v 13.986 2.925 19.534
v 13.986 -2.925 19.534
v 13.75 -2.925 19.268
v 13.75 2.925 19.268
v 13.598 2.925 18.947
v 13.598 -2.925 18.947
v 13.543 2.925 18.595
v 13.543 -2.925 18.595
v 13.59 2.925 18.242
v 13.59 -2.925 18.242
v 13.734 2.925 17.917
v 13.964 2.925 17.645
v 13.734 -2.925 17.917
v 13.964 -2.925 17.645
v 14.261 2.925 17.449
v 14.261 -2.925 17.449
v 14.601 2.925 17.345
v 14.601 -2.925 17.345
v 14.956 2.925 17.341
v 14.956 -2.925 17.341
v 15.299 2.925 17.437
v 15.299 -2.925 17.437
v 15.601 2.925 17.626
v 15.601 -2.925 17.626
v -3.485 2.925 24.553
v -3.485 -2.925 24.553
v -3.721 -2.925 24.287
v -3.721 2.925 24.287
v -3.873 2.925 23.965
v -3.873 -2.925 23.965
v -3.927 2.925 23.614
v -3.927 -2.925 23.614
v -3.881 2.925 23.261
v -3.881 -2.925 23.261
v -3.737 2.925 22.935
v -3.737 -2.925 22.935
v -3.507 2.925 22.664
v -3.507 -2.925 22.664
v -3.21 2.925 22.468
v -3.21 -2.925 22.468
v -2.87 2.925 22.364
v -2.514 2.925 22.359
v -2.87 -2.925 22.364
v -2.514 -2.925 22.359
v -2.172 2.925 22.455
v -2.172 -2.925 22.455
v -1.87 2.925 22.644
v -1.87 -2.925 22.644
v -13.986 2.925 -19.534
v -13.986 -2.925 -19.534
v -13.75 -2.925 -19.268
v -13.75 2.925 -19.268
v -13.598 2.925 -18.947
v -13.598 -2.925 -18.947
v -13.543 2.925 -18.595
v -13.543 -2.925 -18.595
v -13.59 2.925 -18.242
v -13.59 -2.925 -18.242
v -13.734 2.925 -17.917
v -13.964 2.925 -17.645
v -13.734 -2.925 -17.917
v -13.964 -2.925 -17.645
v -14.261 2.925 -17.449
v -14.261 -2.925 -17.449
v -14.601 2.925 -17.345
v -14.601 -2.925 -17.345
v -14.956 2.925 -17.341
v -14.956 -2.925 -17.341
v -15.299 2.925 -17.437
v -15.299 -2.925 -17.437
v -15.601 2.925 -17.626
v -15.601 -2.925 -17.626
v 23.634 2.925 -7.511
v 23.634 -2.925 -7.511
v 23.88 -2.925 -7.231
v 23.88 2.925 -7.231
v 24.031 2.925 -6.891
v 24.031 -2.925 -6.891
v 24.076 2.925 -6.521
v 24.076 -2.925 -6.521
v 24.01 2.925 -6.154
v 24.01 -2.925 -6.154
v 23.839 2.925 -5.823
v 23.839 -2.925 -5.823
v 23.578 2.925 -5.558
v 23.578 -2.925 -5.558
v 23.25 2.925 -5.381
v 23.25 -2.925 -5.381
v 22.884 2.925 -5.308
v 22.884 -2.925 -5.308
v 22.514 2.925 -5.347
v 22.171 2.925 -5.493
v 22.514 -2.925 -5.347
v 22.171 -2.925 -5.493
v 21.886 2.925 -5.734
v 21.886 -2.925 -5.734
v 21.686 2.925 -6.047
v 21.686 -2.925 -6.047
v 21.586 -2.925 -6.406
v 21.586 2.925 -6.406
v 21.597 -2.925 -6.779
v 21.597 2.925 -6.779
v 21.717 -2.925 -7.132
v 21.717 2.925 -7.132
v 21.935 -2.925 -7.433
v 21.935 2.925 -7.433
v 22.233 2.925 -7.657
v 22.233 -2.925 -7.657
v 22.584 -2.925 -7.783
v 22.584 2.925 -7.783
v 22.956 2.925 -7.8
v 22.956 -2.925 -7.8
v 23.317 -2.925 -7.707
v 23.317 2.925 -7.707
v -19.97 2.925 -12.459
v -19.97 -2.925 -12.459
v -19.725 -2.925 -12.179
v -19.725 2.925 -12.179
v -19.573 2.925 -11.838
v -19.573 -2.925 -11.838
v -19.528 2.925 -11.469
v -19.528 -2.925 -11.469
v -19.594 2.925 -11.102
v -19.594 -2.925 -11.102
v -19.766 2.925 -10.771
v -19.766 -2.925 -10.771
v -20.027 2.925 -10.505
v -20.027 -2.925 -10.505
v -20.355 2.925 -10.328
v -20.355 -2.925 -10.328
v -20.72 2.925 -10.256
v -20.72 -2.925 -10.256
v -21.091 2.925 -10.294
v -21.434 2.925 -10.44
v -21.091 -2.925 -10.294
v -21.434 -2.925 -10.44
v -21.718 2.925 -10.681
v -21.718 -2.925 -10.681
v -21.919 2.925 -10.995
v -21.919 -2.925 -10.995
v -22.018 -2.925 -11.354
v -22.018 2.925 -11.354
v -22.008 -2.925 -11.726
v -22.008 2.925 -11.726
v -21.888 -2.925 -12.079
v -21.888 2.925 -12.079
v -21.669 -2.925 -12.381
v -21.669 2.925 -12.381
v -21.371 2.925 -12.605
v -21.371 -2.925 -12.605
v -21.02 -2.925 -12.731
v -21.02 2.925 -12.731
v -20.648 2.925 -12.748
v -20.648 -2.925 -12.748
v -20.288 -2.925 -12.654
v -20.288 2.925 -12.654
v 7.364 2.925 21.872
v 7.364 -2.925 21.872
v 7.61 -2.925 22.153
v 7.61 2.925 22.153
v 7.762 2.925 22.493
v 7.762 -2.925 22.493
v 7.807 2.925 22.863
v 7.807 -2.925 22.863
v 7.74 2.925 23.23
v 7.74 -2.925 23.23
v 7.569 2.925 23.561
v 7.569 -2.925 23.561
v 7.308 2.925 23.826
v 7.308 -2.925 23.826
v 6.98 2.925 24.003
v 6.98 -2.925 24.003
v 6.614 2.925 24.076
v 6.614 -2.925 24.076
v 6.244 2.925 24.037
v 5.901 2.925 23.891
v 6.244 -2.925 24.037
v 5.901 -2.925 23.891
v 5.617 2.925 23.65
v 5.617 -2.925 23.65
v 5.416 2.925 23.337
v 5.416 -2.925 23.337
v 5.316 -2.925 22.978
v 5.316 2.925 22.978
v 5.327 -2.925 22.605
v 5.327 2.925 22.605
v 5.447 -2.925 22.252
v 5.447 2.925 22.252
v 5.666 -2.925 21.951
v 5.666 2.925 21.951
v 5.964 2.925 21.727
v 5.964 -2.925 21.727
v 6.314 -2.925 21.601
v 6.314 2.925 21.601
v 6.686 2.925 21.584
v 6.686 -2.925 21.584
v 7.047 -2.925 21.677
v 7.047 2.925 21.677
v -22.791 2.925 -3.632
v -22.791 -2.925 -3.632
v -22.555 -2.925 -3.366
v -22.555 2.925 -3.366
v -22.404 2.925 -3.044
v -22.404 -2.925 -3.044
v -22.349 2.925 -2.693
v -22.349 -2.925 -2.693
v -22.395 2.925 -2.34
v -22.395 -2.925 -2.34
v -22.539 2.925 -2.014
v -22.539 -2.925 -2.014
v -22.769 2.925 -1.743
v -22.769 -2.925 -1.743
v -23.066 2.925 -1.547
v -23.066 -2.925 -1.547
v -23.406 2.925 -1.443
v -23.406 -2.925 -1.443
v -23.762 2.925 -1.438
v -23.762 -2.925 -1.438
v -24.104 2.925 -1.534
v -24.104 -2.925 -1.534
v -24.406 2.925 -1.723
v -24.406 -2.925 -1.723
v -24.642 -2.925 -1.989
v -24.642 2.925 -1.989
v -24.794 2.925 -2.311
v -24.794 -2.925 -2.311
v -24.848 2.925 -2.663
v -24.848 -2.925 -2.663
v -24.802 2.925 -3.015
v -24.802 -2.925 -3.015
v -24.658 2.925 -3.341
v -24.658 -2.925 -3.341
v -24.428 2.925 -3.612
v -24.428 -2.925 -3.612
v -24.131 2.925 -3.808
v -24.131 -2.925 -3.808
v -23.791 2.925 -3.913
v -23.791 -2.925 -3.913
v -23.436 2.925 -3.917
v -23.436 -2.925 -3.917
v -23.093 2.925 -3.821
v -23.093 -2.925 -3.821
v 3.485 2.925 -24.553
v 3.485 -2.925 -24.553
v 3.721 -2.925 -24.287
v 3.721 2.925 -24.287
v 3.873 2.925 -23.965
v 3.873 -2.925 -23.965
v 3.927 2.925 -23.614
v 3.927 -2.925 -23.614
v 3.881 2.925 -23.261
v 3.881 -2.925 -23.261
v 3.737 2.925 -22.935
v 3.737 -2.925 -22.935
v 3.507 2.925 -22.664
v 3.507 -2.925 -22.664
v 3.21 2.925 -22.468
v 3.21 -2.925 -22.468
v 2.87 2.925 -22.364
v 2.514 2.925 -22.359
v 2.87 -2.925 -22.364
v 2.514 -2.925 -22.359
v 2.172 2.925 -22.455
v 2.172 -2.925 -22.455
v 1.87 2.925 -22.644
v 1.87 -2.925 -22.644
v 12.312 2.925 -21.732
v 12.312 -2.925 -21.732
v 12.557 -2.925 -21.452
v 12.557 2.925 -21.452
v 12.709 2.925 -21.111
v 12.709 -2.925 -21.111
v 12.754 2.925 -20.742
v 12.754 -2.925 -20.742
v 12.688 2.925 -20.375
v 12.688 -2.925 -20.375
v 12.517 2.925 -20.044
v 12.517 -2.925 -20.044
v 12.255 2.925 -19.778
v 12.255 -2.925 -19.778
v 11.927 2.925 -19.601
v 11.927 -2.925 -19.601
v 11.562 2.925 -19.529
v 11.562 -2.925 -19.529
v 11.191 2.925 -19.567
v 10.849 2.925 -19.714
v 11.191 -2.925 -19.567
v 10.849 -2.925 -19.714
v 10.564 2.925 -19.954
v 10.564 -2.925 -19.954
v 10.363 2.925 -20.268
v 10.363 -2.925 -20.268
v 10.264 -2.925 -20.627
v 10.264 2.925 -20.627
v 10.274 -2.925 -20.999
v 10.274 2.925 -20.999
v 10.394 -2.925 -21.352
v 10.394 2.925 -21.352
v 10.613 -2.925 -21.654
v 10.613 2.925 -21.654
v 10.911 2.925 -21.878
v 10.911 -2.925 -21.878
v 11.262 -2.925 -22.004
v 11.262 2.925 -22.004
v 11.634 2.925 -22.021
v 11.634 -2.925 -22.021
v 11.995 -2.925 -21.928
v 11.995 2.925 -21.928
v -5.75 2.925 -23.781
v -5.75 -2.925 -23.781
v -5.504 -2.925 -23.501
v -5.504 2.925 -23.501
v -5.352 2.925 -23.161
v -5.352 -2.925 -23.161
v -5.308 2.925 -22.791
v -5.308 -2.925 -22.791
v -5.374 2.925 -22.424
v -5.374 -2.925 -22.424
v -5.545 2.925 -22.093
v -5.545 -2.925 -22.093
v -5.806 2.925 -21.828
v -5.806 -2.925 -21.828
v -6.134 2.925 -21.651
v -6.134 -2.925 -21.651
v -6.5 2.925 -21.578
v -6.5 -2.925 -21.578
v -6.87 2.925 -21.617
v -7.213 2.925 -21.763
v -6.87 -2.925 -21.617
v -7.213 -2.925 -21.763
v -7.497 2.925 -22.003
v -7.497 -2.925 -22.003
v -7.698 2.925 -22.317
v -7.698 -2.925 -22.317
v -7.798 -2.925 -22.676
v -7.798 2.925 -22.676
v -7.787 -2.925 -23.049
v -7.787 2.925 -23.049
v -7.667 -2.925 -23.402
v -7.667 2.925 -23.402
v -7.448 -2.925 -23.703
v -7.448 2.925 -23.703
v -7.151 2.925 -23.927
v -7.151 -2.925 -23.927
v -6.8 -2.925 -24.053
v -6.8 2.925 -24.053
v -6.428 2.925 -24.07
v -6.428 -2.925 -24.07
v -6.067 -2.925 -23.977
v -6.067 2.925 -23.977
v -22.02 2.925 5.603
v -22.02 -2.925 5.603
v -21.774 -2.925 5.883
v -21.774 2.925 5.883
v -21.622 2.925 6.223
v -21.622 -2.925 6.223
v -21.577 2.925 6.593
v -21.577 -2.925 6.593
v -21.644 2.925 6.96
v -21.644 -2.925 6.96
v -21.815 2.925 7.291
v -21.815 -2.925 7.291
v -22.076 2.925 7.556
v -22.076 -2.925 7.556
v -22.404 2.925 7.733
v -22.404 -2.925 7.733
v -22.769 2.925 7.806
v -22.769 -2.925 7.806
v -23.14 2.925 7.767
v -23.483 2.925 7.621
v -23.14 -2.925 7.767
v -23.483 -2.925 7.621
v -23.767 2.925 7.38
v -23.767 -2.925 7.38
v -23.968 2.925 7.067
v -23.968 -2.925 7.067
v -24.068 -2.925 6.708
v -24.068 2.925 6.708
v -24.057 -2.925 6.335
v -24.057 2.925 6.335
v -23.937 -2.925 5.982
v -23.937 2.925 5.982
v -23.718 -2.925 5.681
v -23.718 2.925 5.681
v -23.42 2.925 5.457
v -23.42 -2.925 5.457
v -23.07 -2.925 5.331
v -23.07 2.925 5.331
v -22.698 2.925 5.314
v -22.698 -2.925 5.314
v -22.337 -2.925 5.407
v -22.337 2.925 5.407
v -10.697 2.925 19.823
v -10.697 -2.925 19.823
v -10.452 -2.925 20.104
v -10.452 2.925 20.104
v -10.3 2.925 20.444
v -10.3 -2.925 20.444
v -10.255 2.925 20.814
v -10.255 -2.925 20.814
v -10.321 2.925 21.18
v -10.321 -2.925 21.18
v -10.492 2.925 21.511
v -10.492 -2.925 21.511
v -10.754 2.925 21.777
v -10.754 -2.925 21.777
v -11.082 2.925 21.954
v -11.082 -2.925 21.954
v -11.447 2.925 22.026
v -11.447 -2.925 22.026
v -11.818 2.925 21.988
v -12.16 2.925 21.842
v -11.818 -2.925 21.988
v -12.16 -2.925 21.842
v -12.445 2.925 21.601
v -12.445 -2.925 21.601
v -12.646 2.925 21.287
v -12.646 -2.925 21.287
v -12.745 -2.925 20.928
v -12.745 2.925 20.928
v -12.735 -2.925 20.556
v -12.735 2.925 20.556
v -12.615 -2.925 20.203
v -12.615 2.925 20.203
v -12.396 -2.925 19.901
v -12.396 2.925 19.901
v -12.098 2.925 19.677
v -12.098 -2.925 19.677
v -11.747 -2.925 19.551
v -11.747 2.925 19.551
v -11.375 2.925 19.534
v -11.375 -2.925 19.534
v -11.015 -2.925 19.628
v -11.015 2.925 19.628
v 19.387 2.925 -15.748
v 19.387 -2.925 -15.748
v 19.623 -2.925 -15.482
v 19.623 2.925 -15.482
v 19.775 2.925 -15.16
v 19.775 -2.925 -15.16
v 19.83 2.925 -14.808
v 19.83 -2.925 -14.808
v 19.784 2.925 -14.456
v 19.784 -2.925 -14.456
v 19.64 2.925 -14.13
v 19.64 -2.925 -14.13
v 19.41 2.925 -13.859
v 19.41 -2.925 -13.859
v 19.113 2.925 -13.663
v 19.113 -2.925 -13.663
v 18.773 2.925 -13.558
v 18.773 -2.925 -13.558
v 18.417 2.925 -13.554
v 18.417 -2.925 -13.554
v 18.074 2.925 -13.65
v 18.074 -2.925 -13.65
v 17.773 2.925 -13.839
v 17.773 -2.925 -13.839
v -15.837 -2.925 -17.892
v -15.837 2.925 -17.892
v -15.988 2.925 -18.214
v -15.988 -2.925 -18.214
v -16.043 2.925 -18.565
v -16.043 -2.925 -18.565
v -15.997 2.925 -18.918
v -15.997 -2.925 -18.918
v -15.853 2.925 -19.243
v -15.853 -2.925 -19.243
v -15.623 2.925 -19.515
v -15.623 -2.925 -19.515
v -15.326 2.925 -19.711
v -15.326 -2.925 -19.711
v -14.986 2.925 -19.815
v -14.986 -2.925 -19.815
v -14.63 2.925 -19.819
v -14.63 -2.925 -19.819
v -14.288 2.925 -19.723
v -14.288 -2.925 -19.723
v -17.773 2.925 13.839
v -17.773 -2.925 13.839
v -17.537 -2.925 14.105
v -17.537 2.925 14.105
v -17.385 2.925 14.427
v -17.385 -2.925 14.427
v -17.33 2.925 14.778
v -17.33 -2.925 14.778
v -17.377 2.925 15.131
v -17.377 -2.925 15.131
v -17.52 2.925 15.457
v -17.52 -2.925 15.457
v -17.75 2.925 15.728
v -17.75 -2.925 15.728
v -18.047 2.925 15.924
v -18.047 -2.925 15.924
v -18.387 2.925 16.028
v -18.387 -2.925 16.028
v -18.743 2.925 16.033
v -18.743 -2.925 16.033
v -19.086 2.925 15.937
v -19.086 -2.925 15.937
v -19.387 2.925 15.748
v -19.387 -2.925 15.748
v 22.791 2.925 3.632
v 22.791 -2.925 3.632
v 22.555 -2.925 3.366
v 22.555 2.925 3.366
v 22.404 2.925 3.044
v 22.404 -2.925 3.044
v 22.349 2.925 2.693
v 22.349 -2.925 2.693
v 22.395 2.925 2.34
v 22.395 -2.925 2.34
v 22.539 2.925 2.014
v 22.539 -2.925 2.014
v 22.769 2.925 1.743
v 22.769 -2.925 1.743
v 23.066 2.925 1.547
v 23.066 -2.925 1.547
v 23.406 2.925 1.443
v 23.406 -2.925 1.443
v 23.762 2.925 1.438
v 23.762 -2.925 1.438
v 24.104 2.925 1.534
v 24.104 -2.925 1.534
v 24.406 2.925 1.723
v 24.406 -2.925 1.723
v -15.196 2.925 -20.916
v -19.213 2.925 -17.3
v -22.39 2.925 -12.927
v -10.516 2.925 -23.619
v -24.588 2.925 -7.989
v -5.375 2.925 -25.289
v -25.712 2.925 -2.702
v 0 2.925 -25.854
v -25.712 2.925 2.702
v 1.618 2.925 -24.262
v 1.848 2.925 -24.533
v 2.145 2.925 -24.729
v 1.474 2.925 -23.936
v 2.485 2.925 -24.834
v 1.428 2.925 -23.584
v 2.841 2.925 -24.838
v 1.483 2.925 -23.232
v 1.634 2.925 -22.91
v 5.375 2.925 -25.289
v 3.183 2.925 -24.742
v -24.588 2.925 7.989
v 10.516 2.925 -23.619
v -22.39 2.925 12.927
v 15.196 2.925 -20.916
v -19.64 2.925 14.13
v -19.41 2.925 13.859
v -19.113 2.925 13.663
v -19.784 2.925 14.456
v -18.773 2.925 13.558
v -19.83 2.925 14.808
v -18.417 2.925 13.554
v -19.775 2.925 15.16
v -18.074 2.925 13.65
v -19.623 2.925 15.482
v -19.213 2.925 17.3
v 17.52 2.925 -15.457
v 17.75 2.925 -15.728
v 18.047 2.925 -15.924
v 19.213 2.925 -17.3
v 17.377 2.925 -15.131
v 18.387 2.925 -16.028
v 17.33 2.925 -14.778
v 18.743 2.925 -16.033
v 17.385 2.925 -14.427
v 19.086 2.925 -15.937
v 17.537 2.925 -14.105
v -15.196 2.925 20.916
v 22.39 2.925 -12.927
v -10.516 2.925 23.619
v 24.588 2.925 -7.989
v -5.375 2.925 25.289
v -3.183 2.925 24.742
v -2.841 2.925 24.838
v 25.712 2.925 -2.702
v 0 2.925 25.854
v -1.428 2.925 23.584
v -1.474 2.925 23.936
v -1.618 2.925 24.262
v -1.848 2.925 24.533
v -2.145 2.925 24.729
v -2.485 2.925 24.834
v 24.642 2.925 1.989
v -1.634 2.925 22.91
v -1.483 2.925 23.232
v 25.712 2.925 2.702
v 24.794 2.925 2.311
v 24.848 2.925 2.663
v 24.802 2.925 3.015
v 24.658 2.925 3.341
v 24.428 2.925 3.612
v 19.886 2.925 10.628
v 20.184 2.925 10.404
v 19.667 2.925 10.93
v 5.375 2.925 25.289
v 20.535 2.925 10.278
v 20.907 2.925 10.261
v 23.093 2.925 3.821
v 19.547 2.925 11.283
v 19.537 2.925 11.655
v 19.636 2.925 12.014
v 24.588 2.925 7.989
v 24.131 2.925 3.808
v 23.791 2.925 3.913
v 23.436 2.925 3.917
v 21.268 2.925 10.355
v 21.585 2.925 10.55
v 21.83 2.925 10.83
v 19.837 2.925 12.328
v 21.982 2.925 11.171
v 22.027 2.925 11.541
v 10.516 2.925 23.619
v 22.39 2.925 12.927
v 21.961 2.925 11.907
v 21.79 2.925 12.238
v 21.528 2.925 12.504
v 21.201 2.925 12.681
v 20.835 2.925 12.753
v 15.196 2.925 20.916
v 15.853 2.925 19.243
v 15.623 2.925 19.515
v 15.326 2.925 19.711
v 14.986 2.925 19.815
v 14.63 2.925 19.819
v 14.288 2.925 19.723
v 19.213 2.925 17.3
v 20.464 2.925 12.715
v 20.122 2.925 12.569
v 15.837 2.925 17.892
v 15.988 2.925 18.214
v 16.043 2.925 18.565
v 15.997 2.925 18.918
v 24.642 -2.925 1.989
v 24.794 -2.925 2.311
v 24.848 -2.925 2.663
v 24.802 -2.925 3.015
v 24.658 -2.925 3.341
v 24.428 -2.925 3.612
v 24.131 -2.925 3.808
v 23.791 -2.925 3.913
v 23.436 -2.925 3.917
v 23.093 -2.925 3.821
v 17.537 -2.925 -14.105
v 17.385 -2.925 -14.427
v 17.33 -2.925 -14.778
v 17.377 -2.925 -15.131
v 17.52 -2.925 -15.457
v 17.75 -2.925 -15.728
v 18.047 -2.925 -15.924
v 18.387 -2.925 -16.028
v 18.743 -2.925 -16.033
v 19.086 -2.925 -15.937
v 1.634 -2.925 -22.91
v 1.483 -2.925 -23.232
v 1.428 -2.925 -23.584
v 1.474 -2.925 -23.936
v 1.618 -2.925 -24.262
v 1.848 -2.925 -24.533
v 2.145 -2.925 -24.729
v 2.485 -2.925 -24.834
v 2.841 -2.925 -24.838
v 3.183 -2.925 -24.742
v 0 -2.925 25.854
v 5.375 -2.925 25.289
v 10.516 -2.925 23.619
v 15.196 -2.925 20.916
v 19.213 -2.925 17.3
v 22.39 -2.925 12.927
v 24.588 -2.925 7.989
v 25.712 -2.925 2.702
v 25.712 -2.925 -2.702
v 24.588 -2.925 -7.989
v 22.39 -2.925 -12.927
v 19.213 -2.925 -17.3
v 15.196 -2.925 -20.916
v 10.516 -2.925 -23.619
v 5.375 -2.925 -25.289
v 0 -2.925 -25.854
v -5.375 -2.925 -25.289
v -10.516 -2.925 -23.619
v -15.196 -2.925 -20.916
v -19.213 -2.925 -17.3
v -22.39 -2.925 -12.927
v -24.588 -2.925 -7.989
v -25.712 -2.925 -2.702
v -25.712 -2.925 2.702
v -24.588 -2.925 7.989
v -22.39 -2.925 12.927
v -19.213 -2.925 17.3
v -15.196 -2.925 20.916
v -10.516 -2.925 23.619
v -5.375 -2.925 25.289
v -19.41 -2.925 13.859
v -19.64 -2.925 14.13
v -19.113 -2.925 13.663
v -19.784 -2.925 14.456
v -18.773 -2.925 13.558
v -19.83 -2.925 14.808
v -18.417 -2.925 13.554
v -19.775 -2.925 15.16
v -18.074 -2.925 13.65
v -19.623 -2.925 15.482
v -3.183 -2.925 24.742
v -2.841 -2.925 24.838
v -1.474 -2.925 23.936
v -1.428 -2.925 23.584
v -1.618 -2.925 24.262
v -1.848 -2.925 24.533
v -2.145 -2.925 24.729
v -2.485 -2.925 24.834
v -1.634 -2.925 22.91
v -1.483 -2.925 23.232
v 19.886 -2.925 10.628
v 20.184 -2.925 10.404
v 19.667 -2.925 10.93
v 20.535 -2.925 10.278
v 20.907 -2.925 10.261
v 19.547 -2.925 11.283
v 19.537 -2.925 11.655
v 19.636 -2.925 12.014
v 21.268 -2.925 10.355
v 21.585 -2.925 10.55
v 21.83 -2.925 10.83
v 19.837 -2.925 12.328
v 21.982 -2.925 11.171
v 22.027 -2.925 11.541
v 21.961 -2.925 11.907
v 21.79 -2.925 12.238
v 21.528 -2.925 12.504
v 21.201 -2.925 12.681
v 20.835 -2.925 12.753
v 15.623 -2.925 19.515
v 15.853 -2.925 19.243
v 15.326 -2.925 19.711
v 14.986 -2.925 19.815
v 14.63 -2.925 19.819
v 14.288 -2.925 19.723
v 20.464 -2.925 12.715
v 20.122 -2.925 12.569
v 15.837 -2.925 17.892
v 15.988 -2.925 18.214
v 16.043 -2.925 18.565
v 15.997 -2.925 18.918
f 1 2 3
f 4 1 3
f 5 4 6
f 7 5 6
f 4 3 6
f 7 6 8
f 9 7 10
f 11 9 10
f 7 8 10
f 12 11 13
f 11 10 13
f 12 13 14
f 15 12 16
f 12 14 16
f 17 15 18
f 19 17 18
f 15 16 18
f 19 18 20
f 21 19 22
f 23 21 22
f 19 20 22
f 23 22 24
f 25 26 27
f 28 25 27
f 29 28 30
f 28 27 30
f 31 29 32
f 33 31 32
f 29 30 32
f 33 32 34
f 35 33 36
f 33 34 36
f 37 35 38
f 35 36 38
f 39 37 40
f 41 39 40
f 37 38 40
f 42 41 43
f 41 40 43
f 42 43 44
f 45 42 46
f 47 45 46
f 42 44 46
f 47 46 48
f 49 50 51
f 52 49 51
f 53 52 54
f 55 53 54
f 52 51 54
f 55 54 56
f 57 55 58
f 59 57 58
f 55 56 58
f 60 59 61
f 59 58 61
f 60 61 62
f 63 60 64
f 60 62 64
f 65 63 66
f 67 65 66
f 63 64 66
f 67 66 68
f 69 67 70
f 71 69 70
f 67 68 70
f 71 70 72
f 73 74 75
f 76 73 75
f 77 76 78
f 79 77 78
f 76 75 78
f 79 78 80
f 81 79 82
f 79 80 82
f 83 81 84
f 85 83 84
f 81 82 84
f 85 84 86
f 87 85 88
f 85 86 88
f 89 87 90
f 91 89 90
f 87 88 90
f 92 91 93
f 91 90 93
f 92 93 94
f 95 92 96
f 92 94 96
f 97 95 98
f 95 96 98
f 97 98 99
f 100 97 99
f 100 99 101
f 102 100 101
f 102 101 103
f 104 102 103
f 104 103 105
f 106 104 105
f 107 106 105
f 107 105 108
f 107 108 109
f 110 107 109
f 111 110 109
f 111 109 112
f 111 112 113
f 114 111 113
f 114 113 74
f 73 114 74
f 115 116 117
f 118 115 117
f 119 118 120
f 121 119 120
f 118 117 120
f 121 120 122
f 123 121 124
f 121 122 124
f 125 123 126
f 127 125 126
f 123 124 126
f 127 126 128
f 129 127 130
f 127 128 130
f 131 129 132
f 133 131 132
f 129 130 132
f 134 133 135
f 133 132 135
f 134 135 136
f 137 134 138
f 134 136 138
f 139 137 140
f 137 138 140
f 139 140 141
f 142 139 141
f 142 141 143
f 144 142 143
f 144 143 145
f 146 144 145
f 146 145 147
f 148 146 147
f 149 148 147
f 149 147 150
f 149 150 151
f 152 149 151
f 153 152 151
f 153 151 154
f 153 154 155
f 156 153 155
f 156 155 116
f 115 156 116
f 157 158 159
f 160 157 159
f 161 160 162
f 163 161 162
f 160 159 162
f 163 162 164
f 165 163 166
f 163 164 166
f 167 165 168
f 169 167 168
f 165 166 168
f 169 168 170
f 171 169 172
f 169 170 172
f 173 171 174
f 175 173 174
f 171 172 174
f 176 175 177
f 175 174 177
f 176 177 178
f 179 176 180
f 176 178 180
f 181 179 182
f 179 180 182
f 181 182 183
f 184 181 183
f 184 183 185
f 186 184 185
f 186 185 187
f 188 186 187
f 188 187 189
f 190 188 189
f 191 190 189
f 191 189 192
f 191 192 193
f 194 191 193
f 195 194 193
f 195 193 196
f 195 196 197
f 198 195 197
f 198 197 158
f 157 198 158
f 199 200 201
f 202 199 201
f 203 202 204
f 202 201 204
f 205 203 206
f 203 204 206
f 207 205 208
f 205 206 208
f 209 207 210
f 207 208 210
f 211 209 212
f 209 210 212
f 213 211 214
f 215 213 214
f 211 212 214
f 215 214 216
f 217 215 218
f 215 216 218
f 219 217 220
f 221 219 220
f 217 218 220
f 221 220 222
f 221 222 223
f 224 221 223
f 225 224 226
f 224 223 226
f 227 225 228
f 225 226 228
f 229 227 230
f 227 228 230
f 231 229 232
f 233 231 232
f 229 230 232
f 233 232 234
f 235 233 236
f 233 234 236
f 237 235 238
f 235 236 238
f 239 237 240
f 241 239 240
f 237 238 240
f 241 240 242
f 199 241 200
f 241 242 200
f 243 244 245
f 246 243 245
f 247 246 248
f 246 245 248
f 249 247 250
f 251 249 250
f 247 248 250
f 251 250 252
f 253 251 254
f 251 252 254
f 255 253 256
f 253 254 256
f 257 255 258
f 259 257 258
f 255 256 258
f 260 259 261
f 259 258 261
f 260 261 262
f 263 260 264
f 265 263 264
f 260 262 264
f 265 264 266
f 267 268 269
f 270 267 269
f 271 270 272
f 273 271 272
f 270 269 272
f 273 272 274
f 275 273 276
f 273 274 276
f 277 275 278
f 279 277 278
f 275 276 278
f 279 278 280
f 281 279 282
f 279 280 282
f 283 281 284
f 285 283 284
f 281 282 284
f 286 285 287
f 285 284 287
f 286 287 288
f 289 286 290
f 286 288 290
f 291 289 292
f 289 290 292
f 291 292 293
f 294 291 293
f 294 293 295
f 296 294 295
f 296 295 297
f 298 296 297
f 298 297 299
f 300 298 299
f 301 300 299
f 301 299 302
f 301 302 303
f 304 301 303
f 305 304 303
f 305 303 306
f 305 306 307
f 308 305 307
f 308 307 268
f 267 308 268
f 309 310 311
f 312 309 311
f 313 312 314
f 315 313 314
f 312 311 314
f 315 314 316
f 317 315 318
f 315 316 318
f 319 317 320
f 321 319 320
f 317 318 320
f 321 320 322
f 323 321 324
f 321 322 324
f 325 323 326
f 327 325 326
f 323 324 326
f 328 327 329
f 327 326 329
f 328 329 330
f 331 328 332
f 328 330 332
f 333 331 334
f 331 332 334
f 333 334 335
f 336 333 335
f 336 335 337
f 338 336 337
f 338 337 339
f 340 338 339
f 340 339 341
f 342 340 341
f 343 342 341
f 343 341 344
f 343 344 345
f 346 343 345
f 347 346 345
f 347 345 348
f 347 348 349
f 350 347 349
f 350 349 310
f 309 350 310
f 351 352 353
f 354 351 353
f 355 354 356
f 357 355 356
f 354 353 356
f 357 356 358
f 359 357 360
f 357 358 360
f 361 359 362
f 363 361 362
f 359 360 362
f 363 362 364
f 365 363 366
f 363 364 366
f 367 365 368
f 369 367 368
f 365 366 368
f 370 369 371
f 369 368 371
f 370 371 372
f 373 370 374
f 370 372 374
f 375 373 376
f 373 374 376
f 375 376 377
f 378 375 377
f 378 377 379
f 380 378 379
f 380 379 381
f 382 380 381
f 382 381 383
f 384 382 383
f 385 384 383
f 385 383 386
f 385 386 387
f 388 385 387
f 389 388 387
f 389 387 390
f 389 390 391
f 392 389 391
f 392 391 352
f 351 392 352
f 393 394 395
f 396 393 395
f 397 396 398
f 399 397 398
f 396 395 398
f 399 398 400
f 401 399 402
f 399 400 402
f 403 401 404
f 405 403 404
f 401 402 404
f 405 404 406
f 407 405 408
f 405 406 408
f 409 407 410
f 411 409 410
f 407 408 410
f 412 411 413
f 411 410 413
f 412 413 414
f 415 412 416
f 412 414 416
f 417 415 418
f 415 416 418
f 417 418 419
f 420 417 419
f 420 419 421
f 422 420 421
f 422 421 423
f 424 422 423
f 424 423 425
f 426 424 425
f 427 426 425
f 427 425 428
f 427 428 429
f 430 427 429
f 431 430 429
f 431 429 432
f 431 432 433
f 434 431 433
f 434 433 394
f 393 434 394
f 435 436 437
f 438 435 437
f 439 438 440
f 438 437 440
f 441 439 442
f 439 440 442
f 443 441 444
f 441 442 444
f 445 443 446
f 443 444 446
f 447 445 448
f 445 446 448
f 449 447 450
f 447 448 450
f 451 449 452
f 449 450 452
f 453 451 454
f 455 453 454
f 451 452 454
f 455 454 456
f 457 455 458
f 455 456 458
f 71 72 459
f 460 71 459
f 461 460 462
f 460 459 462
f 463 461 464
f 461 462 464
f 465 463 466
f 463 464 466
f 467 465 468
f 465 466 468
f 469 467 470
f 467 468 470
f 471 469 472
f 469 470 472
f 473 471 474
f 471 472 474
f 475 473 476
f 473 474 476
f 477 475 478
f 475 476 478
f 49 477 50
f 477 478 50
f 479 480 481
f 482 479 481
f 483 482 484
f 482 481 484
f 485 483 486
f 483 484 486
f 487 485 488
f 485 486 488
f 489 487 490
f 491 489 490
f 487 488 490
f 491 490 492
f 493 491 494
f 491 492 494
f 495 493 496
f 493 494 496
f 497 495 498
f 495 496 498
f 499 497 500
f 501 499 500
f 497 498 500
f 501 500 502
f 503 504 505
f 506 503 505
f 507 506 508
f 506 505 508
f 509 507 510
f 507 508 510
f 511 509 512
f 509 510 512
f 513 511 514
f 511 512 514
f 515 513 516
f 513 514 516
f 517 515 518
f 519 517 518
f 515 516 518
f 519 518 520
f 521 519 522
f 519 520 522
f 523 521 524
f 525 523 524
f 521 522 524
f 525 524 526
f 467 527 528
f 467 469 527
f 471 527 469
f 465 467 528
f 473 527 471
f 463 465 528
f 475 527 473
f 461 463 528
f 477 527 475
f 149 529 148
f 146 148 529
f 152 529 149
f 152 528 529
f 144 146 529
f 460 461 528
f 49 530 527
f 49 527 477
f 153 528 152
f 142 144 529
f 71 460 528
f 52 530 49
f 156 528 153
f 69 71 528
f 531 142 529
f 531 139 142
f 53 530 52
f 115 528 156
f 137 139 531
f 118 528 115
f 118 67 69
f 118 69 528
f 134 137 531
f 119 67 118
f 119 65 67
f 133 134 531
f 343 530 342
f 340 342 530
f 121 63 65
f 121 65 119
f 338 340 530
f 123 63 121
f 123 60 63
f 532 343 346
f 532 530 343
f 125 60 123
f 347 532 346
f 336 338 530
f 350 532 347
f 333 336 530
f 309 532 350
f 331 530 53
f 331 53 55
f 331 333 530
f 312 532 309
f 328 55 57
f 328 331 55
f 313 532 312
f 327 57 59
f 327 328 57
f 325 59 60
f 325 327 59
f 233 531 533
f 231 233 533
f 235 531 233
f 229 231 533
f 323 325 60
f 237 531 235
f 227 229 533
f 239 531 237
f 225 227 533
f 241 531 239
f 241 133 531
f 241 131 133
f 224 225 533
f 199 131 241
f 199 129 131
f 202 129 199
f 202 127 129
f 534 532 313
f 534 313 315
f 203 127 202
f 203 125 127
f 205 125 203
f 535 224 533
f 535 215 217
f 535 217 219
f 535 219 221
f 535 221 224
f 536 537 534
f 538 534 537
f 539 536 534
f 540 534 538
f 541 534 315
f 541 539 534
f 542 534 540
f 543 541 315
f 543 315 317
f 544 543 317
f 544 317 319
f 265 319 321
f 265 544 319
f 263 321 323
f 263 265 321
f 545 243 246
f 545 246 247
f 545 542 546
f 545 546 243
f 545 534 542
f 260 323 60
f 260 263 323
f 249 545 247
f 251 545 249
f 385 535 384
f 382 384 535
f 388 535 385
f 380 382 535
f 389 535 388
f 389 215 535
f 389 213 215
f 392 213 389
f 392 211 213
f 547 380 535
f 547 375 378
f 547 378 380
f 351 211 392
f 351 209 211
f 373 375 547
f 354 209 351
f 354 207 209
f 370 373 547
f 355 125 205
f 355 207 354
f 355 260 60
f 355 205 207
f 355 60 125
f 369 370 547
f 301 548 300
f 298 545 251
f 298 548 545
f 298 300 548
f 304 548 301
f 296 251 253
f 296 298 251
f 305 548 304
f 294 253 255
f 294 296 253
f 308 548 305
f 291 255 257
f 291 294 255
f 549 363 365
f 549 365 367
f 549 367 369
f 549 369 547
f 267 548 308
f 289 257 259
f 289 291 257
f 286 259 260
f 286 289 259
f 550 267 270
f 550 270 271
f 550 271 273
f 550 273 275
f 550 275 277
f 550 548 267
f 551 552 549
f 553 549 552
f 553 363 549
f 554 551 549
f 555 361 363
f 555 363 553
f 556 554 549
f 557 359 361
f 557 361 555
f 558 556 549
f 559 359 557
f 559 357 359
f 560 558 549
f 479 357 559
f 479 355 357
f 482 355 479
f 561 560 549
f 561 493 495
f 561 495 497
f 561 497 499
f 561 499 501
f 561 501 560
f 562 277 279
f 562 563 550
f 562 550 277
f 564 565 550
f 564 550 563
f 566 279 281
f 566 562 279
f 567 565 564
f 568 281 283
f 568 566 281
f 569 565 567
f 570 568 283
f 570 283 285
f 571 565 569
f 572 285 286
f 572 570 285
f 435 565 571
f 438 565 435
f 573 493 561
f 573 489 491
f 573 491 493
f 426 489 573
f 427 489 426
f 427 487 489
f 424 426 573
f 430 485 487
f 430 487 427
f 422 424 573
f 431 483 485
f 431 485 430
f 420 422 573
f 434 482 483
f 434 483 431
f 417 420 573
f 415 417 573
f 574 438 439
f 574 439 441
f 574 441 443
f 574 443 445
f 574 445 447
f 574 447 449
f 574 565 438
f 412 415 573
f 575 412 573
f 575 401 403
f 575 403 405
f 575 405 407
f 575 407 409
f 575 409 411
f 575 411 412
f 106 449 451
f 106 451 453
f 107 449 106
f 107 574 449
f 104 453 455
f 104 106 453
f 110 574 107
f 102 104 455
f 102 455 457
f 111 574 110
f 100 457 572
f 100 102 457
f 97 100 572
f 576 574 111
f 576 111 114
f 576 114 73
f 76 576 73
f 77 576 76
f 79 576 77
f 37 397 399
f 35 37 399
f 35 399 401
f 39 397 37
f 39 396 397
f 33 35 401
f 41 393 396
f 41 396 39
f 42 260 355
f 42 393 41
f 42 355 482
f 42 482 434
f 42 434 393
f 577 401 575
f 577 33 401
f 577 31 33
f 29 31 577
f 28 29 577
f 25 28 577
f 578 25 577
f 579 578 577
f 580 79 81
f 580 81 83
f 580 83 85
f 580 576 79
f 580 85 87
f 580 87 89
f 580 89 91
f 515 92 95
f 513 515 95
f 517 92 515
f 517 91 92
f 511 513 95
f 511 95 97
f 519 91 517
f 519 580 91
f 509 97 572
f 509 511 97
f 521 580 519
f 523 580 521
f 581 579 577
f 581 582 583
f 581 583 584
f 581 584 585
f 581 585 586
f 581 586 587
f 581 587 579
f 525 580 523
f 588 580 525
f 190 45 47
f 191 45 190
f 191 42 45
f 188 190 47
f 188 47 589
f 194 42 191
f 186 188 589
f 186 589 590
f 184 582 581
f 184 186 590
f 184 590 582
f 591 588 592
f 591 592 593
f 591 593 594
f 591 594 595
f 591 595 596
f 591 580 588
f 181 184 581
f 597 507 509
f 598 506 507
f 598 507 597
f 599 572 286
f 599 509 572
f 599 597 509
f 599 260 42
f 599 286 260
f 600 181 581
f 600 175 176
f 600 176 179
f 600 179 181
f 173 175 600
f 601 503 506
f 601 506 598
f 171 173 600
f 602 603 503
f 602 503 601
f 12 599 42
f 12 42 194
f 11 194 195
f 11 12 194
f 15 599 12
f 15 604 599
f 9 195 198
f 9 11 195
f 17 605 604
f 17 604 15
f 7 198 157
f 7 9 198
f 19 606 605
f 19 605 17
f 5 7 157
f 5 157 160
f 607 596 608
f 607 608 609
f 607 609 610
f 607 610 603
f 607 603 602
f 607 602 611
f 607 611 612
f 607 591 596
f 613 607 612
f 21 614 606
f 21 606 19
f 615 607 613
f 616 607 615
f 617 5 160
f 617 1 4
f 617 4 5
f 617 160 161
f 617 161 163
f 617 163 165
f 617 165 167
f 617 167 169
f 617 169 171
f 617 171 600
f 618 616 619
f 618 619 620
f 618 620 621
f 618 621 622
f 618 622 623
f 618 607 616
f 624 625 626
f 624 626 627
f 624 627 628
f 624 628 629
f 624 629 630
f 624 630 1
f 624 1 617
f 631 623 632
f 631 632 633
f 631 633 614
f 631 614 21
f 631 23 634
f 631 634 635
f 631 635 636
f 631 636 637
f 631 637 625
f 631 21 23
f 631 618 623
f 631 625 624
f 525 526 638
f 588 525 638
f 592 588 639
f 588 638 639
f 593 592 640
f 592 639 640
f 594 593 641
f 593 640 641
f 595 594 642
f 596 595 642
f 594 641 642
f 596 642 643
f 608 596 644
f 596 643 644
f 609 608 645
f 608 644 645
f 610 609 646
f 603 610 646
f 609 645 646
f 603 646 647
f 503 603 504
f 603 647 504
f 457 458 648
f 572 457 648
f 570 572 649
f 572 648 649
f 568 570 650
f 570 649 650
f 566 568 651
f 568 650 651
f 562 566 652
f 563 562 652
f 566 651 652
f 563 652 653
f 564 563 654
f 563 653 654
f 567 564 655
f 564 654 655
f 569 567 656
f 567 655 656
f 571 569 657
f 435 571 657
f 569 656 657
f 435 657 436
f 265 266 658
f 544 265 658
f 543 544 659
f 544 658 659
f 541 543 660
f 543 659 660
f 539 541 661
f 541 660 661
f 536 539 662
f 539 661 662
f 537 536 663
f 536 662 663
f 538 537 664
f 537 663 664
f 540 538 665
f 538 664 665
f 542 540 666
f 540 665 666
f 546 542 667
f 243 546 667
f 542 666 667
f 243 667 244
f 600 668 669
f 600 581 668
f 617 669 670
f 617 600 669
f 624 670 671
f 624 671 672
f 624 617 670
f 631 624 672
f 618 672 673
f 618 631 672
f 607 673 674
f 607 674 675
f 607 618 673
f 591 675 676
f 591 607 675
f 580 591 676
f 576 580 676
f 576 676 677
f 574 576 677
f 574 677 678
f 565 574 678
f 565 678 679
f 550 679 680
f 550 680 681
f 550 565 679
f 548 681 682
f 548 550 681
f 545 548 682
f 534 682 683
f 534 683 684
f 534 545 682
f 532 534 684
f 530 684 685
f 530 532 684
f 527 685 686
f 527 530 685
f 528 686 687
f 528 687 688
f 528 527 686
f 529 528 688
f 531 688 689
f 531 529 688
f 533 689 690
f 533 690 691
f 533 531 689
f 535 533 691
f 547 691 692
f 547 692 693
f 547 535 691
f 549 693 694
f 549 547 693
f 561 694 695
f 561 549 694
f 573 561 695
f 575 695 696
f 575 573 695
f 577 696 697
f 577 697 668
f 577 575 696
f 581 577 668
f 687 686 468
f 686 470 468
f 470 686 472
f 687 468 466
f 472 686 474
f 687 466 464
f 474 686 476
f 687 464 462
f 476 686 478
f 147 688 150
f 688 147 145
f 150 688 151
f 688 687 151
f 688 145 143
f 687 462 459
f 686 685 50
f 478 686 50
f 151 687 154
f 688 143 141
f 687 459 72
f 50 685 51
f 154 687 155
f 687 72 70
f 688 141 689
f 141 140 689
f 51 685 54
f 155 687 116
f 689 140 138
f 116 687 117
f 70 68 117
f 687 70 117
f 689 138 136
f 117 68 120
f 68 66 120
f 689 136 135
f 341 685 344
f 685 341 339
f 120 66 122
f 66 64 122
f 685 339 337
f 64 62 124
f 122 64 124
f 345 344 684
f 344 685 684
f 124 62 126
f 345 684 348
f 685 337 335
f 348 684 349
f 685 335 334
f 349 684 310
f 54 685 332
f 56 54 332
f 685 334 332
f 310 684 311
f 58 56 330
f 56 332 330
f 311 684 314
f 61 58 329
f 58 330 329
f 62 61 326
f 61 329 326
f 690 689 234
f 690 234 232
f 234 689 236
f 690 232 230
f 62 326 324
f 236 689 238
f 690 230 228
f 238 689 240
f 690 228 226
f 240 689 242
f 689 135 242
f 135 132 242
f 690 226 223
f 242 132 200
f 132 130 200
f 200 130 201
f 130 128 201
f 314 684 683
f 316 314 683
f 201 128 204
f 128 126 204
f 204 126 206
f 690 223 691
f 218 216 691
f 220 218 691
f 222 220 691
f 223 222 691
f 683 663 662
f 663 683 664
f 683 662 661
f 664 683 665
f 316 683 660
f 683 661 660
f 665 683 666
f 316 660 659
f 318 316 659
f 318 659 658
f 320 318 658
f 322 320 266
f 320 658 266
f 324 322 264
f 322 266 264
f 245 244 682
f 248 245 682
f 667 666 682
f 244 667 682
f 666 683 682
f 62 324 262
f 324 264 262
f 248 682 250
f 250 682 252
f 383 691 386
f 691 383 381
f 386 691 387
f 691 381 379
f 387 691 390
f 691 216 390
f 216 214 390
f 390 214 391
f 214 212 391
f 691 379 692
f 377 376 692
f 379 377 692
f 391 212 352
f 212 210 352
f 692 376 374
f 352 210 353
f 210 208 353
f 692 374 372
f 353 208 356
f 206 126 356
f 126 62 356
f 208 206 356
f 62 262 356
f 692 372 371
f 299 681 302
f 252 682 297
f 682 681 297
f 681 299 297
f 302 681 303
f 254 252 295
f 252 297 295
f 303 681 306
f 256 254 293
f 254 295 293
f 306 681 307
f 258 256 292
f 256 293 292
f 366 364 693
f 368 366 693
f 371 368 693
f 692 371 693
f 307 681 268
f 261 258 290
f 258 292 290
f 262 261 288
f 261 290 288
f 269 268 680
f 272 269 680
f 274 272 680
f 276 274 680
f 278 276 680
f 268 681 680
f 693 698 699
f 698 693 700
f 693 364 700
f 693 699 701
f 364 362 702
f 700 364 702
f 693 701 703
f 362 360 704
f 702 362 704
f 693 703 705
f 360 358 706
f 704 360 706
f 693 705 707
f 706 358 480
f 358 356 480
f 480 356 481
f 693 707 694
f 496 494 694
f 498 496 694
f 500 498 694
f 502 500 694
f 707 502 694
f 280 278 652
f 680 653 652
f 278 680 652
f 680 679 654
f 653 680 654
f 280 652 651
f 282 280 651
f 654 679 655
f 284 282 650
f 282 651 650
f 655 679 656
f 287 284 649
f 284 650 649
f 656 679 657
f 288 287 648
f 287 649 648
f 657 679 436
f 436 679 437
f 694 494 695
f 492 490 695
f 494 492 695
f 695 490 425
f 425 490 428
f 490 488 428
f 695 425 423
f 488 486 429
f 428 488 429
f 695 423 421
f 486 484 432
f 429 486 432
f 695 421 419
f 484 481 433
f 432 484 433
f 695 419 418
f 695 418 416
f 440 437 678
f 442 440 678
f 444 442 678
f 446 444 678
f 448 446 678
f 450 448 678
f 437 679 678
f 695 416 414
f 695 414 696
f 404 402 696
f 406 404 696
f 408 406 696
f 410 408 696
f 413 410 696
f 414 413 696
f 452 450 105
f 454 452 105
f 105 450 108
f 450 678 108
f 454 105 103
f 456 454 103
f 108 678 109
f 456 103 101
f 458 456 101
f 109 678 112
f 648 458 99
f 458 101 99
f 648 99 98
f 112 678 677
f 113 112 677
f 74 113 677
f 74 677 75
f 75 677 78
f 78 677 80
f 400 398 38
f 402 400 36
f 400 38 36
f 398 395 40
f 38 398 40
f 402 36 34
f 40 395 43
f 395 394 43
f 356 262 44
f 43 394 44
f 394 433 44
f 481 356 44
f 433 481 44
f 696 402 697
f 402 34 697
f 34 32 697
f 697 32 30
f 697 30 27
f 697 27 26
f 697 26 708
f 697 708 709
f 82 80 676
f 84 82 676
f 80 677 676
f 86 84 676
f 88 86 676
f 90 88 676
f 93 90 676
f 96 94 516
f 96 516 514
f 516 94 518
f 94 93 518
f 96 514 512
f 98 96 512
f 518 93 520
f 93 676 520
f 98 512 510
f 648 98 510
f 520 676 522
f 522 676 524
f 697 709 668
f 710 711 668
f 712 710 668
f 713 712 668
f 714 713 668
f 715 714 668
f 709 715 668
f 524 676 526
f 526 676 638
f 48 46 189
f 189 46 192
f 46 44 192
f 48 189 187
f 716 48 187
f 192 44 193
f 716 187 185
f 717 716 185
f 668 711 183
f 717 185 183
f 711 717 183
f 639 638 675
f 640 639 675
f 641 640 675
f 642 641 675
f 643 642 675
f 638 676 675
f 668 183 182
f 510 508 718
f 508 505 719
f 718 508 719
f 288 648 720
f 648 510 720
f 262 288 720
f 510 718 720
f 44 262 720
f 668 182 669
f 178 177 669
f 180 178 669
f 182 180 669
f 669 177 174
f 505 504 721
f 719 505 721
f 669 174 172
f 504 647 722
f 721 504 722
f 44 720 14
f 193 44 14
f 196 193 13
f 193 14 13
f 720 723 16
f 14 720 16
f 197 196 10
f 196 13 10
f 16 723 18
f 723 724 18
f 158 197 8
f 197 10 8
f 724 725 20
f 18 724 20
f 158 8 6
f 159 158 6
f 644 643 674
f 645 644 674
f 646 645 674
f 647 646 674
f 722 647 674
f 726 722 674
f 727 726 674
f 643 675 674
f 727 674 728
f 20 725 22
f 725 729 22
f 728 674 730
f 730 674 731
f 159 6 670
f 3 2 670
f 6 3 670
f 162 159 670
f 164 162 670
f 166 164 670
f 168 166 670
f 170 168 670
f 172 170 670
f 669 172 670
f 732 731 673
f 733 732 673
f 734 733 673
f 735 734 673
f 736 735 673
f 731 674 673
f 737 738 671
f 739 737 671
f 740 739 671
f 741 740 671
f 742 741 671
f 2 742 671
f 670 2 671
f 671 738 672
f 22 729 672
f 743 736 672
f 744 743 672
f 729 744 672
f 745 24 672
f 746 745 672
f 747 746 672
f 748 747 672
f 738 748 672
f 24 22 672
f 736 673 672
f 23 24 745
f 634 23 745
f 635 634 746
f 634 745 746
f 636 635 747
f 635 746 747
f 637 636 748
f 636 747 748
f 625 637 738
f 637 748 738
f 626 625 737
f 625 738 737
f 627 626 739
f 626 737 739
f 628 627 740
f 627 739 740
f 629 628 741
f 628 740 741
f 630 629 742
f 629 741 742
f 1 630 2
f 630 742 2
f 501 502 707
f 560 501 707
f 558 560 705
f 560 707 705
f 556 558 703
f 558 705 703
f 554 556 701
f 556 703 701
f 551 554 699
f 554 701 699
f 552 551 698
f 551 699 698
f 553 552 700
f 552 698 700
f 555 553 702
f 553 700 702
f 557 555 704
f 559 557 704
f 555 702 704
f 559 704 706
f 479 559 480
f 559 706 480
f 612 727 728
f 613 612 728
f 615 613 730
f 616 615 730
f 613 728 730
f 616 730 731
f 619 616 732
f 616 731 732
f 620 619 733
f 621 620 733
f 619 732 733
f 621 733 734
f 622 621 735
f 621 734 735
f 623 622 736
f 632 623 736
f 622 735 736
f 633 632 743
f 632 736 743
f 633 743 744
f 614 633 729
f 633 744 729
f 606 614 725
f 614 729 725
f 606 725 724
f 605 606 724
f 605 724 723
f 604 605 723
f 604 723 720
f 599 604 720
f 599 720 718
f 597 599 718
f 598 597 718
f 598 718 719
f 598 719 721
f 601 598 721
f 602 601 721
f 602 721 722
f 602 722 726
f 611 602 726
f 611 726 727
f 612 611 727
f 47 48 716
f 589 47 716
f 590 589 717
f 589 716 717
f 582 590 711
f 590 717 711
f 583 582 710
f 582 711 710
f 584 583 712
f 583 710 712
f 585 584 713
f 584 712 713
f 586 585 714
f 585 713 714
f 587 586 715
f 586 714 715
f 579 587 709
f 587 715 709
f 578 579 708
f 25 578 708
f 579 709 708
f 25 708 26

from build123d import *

# Parameters (mm, degrees)
SKETCH1_R           = 25.85370091
BOSS_EXTRUDE1_DEPTH = 2.925
CUT_EXTRUDE1_DEPTH  = 38.02769506


with BuildPart() as part:
    # Sketch1 → Boss-Extrude1 (new, symmetric)
    with BuildSketch(Plane(origin=(0, 0, 0), x_dir=(1, 0, 0), z_dir=(0, 1, 0))):
        with Locations(Location((0, 0, 0), (0, 0, 270))):
            Circle(SKETCH1_R)
    extrude(amount=BOSS_EXTRUDE1_DEPTH, both=True)

    # Sketch2 → Cut-Extrude1 (cut, through all)
    with BuildSketch(Plane.XZ.offset(2.925)):
        with BuildLine():
            ThreePointArc((22.019698731, -5.602620776), (21.872491194, -7.364247848), (23.634118266, -7.511455385))
            ThreePointArc((23.634118266, -7.511455385), (23.781325803, -5.749828313), (22.019698731, -5.602620776))
        make_face()
        with BuildLine():
            ThreePointArc((22.791373624, 3.631983723), (22.644166087, 1.87035665), (24.405793159, 1.723149114))
            ThreePointArc((24.405793159, 1.723149114), (24.553000696, 3.484776186), (22.791373624, 3.631983723))
        make_face()
        with BuildLine():
            ThreePointArc((17.772833946, -13.838975667), (17.625626409, -15.600602739), (19.387253481, -15.747810276))
            ThreePointArc((19.387253481, -15.747810276), (19.534461018, -13.986183203), (17.772833946, -13.838975667))
        make_face()
        with BuildLine():
            ThreePointArc((10.697325934, -19.82317058), (10.550118397, -21.584797652), (12.311745469, -21.732005189))
            ThreePointArc((12.311745469, -21.732005189), (12.458953006, -19.970378117), (10.697325934, -19.82317058))
        make_face()
        with BuildLine():
            ThreePointArc((1.87035665, -22.644166087), (1.723149114, -24.405793159), (3.484776186, -24.553000696))
            ThreePointArc((3.484776186, -24.553000696), (3.631983723, -22.791373624), (1.87035665, -22.644166087))
        make_face()
        with BuildLine():
            ThreePointArc((-7.364247848, -21.872491194), (-7.511455385, -23.634118266), (-5.749828313, -23.781325803))
            ThreePointArc((-5.749828313, -23.781325803), (-5.602620776, -22.019698731), (-7.364247848, -21.872491194))
        make_face()
        with BuildLine():
            ThreePointArc((-15.600602739, -17.625626409), (-15.747810276, -19.387253481), (-13.986183203, -19.534461018))
            ThreePointArc((-13.986183203, -19.534461018), (-13.838975667, -17.772833946), (-15.600602739, -17.625626409))
        make_face()
        with BuildLine():
            ThreePointArc((-21.584797652, -10.550118397), (-21.732005189, -12.311745469), (-19.970378117, -12.458953006))
            ThreePointArc((-19.970378117, -12.458953006), (-19.82317058, -10.697325934), (-21.584797652, -10.550118397))
        make_face()
        with BuildLine():
            ThreePointArc((-24.405793159, -1.723149114), (-24.553000696, -3.484776186), (-22.791373624, -3.631983723))
            ThreePointArc((-22.791373624, -3.631983723), (-22.644166087, -1.87035665), (-24.405793159, -1.723149114))
        make_face()
        with BuildLine():
            ThreePointArc((-23.634118266, 7.511455385), (-23.781325803, 5.749828313), (-22.019698731, 5.602620776))
            ThreePointArc((-22.019698731, 5.602620776), (-21.872491194, 7.364247848), (-23.634118266, 7.511455385))
        make_face()
        with BuildLine():
            ThreePointArc((-19.387253481, 15.747810276), (-19.534461018, 13.986183203), (-17.772833946, 13.838975667))
            ThreePointArc((-17.772833946, 13.838975667), (-17.625626409, 15.600602739), (-19.387253481, 15.747810276))
        make_face()
        with BuildLine():
            ThreePointArc((-12.311745469, 21.732005189), (-12.458953006, 19.970378117), (-10.697325934, 19.82317058))
            ThreePointArc((-10.697325934, 19.82317058), (-10.550118397, 21.584797652), (-12.311745469, 21.732005189))
        make_face()
        with BuildLine():
            ThreePointArc((-3.484776186, 24.553000696), (-3.631983723, 22.791373624), (-1.87035665, 22.644166087))
            ThreePointArc((-1.87035665, 22.644166087), (-1.723149114, 24.405793159), (-3.484776186, 24.553000696))
        make_face()
        with BuildLine():
            ThreePointArc((5.749828313, 23.781325803), (5.602620776, 22.019698731), (7.364247848, 21.872491194))
            ThreePointArc((7.364247848, 21.872491194), (7.511455385, 23.634118266), (5.749828313, 23.781325803))
        make_face()
        with BuildLine():
            ThreePointArc((19.970378117, 12.458953006), (19.82317058, 10.697325934), (21.584797652, 10.550118397))
            ThreePointArc((21.584797652, 10.550118397), (21.732005189, 12.311745469), (19.970378117, 12.458953006))
        make_face()
        with BuildLine():
            ThreePointArc((13.986183203, 19.534461018), (13.838975667, 17.772833946), (15.600602739, 17.625626409))
            ThreePointArc((15.600602739, 17.625626409), (15.747810276, 19.387253481), (13.986183203, 19.534461018))
        make_face()
    extrude(amount=-CUT_EXTRUDE1_DEPTH, mode=Mode.SUBTRACT)


solid = part.part
